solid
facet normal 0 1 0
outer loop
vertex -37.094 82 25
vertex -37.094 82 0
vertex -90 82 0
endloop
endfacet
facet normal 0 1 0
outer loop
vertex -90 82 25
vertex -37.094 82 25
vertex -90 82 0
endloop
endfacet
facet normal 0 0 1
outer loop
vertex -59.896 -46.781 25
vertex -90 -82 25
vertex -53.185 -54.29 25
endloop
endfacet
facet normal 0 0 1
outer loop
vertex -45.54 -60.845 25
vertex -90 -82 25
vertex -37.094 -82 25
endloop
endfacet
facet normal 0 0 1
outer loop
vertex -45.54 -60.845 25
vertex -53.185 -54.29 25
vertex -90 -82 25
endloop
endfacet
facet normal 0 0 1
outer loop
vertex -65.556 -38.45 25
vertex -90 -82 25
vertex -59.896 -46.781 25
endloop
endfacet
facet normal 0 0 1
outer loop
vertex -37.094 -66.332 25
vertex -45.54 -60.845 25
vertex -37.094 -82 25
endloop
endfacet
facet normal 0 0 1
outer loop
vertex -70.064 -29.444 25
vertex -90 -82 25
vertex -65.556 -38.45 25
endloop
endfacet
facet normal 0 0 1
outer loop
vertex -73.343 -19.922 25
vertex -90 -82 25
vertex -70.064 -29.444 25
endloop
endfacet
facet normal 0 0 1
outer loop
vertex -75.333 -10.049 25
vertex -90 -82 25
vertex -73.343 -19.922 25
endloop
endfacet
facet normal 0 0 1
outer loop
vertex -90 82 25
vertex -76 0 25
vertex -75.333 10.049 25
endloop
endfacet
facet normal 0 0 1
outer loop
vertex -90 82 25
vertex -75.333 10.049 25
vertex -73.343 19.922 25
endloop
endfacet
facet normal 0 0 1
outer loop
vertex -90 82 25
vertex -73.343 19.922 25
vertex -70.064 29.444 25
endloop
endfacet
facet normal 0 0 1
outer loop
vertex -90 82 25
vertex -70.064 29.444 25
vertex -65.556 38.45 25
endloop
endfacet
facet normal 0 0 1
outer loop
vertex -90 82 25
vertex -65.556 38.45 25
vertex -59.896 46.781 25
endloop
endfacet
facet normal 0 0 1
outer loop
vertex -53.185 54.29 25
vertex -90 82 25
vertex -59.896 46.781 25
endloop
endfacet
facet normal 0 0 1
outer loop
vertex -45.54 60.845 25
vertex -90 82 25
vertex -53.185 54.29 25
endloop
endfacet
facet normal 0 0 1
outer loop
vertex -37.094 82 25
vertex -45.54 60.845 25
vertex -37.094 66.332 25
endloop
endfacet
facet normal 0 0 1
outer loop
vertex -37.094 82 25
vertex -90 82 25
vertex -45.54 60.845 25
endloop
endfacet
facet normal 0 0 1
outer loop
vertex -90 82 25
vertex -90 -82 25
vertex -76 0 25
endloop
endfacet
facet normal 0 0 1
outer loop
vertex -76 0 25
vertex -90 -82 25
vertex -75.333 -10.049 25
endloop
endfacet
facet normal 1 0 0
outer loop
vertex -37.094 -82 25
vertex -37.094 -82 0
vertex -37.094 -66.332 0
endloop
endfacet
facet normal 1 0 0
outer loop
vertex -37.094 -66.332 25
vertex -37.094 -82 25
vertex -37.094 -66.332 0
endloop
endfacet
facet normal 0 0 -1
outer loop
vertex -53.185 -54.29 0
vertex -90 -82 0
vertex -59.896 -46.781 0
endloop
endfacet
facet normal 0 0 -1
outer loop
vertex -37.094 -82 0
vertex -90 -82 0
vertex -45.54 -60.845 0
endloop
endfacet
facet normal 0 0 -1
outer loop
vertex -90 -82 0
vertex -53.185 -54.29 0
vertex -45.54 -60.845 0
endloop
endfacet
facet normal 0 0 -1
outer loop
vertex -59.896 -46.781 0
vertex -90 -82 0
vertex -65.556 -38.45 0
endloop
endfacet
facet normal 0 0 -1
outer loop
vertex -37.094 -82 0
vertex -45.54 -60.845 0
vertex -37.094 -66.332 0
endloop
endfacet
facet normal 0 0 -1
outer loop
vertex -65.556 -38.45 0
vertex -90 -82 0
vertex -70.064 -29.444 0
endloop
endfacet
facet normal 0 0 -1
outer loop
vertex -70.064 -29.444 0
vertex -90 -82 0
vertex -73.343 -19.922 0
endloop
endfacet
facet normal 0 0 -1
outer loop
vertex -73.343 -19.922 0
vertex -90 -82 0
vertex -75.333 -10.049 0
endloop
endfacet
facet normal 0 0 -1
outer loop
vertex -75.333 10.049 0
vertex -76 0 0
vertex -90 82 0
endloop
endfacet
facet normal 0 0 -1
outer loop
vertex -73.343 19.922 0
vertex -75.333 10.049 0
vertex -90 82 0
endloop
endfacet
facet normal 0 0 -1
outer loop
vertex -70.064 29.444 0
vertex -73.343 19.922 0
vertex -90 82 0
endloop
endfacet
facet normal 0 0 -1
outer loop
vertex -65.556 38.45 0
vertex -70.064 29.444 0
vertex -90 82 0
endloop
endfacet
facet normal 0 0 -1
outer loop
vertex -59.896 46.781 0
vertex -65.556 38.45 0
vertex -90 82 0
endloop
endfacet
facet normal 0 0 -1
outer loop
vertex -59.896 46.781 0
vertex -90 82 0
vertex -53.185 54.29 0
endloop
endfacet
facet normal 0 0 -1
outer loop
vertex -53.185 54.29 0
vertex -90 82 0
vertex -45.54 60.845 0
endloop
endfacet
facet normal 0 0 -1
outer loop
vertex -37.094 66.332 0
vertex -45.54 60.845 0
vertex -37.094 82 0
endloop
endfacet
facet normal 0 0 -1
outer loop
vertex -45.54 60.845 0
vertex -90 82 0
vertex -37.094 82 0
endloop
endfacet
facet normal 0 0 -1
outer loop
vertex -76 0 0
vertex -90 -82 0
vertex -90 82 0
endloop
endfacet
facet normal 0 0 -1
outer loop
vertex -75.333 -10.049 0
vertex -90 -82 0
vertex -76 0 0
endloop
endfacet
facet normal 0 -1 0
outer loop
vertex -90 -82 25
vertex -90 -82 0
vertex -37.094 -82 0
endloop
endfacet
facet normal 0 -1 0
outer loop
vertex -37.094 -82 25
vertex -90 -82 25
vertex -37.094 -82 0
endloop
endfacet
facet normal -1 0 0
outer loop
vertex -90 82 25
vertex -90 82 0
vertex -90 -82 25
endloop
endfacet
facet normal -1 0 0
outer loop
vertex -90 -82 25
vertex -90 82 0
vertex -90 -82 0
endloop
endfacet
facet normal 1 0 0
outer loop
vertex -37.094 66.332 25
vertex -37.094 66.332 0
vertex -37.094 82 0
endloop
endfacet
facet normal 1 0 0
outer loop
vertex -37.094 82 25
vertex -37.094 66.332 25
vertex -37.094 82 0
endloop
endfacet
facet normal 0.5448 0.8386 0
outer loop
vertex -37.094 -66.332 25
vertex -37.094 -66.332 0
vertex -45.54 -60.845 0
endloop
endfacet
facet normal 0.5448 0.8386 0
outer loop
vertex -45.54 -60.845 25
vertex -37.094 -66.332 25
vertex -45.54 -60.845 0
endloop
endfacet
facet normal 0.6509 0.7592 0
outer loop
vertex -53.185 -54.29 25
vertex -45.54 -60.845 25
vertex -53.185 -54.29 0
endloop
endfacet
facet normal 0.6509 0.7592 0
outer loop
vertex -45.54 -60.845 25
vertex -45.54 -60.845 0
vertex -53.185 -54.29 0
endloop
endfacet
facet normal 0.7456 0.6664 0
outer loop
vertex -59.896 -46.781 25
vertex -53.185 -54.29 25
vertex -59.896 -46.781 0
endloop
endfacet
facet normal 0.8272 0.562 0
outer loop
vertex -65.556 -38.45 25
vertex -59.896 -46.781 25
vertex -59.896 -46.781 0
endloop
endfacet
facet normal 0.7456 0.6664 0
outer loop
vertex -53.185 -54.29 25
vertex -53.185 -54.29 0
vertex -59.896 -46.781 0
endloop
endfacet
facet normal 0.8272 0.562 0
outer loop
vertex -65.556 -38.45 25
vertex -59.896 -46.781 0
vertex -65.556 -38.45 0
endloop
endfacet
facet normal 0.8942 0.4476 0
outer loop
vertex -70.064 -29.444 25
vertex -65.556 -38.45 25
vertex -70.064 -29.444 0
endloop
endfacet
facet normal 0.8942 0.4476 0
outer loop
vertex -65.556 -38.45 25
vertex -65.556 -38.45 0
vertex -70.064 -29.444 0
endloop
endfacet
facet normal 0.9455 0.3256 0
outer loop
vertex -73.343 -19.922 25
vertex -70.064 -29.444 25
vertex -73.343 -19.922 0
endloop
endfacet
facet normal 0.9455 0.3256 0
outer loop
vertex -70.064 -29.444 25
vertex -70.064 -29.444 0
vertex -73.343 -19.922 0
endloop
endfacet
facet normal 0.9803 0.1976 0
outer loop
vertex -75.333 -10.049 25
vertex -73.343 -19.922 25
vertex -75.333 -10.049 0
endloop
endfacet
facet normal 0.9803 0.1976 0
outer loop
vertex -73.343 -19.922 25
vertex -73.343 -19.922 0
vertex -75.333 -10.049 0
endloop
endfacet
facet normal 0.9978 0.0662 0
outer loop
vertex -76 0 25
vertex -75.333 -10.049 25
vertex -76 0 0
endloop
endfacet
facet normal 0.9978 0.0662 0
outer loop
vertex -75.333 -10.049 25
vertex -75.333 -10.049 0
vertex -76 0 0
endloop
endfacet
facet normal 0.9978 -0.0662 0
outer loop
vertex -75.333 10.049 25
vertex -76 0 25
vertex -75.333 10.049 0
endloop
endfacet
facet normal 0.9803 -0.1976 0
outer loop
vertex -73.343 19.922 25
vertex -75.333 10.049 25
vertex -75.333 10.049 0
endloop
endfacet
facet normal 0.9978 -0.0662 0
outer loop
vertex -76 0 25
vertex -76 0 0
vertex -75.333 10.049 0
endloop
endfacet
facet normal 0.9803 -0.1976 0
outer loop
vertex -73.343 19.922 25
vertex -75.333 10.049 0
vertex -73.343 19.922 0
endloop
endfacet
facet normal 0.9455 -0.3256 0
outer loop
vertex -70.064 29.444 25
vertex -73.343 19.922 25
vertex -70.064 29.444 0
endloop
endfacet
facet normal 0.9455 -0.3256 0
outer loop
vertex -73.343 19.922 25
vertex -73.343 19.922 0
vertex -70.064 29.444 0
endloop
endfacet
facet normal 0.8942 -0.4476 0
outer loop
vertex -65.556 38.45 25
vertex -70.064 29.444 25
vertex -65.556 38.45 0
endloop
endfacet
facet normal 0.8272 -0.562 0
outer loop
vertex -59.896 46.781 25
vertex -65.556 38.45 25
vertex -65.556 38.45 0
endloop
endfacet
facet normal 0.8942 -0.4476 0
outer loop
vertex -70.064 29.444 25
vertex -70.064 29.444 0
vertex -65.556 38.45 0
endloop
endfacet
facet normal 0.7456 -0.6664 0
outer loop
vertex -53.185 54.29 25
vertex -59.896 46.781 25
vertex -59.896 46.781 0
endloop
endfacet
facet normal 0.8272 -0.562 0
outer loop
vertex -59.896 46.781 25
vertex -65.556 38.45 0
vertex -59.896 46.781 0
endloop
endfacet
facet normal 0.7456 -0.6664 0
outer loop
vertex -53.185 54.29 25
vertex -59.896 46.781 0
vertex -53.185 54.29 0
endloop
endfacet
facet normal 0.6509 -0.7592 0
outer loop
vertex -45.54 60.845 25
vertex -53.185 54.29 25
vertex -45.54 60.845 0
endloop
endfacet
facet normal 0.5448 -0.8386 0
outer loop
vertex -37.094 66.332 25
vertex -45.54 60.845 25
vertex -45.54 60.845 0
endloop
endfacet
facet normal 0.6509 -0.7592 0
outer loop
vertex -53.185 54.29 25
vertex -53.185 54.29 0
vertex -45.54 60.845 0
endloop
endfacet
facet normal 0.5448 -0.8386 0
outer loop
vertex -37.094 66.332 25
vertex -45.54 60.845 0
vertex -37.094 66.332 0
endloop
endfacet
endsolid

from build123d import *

# Parameters (mm, degrees)
F1_DEPTH = 25


with BuildPart() as f1:
    # F0 (on Top) → F1 (new body)
    with BuildSketch(Plane.XY):
        with BuildLine():
            ThreePointArc((-37.094474, -66.332496), (-76, 0), (-37.094474, 66.332496))
            Line((-37.094474, 66.332496), (-37.094474, 82))
            ThreePointArc((-37.094474, 82), (-75.625732, 48.792916), (-90, 0))
            ThreePointArc((-90, 0), (-75.625732, -48.792916), (-37.094474, -82))
            Line((-37.094474, -82), (-37.094474, -66.332496))
        make_face()
        with BuildLine():
            ThreePointArc((-90, 0), (-75.625732, 48.792916), (-37.094474, 82))
            Line((-37.094474, 82), (-90, 82))
            Line((-90, 82), (-90, 0))
        make_face()
        with BuildLine():
            Line((-90, -82), (-37.094474, -82))
            ThreePointArc((-37.094474, -82), (-75.625732, -48.792916), (-90, 0))
            Line((-90, 0), (-90, -82))
        make_face()
    extrude(amount=F1_DEPTH)


solid = f1.part
